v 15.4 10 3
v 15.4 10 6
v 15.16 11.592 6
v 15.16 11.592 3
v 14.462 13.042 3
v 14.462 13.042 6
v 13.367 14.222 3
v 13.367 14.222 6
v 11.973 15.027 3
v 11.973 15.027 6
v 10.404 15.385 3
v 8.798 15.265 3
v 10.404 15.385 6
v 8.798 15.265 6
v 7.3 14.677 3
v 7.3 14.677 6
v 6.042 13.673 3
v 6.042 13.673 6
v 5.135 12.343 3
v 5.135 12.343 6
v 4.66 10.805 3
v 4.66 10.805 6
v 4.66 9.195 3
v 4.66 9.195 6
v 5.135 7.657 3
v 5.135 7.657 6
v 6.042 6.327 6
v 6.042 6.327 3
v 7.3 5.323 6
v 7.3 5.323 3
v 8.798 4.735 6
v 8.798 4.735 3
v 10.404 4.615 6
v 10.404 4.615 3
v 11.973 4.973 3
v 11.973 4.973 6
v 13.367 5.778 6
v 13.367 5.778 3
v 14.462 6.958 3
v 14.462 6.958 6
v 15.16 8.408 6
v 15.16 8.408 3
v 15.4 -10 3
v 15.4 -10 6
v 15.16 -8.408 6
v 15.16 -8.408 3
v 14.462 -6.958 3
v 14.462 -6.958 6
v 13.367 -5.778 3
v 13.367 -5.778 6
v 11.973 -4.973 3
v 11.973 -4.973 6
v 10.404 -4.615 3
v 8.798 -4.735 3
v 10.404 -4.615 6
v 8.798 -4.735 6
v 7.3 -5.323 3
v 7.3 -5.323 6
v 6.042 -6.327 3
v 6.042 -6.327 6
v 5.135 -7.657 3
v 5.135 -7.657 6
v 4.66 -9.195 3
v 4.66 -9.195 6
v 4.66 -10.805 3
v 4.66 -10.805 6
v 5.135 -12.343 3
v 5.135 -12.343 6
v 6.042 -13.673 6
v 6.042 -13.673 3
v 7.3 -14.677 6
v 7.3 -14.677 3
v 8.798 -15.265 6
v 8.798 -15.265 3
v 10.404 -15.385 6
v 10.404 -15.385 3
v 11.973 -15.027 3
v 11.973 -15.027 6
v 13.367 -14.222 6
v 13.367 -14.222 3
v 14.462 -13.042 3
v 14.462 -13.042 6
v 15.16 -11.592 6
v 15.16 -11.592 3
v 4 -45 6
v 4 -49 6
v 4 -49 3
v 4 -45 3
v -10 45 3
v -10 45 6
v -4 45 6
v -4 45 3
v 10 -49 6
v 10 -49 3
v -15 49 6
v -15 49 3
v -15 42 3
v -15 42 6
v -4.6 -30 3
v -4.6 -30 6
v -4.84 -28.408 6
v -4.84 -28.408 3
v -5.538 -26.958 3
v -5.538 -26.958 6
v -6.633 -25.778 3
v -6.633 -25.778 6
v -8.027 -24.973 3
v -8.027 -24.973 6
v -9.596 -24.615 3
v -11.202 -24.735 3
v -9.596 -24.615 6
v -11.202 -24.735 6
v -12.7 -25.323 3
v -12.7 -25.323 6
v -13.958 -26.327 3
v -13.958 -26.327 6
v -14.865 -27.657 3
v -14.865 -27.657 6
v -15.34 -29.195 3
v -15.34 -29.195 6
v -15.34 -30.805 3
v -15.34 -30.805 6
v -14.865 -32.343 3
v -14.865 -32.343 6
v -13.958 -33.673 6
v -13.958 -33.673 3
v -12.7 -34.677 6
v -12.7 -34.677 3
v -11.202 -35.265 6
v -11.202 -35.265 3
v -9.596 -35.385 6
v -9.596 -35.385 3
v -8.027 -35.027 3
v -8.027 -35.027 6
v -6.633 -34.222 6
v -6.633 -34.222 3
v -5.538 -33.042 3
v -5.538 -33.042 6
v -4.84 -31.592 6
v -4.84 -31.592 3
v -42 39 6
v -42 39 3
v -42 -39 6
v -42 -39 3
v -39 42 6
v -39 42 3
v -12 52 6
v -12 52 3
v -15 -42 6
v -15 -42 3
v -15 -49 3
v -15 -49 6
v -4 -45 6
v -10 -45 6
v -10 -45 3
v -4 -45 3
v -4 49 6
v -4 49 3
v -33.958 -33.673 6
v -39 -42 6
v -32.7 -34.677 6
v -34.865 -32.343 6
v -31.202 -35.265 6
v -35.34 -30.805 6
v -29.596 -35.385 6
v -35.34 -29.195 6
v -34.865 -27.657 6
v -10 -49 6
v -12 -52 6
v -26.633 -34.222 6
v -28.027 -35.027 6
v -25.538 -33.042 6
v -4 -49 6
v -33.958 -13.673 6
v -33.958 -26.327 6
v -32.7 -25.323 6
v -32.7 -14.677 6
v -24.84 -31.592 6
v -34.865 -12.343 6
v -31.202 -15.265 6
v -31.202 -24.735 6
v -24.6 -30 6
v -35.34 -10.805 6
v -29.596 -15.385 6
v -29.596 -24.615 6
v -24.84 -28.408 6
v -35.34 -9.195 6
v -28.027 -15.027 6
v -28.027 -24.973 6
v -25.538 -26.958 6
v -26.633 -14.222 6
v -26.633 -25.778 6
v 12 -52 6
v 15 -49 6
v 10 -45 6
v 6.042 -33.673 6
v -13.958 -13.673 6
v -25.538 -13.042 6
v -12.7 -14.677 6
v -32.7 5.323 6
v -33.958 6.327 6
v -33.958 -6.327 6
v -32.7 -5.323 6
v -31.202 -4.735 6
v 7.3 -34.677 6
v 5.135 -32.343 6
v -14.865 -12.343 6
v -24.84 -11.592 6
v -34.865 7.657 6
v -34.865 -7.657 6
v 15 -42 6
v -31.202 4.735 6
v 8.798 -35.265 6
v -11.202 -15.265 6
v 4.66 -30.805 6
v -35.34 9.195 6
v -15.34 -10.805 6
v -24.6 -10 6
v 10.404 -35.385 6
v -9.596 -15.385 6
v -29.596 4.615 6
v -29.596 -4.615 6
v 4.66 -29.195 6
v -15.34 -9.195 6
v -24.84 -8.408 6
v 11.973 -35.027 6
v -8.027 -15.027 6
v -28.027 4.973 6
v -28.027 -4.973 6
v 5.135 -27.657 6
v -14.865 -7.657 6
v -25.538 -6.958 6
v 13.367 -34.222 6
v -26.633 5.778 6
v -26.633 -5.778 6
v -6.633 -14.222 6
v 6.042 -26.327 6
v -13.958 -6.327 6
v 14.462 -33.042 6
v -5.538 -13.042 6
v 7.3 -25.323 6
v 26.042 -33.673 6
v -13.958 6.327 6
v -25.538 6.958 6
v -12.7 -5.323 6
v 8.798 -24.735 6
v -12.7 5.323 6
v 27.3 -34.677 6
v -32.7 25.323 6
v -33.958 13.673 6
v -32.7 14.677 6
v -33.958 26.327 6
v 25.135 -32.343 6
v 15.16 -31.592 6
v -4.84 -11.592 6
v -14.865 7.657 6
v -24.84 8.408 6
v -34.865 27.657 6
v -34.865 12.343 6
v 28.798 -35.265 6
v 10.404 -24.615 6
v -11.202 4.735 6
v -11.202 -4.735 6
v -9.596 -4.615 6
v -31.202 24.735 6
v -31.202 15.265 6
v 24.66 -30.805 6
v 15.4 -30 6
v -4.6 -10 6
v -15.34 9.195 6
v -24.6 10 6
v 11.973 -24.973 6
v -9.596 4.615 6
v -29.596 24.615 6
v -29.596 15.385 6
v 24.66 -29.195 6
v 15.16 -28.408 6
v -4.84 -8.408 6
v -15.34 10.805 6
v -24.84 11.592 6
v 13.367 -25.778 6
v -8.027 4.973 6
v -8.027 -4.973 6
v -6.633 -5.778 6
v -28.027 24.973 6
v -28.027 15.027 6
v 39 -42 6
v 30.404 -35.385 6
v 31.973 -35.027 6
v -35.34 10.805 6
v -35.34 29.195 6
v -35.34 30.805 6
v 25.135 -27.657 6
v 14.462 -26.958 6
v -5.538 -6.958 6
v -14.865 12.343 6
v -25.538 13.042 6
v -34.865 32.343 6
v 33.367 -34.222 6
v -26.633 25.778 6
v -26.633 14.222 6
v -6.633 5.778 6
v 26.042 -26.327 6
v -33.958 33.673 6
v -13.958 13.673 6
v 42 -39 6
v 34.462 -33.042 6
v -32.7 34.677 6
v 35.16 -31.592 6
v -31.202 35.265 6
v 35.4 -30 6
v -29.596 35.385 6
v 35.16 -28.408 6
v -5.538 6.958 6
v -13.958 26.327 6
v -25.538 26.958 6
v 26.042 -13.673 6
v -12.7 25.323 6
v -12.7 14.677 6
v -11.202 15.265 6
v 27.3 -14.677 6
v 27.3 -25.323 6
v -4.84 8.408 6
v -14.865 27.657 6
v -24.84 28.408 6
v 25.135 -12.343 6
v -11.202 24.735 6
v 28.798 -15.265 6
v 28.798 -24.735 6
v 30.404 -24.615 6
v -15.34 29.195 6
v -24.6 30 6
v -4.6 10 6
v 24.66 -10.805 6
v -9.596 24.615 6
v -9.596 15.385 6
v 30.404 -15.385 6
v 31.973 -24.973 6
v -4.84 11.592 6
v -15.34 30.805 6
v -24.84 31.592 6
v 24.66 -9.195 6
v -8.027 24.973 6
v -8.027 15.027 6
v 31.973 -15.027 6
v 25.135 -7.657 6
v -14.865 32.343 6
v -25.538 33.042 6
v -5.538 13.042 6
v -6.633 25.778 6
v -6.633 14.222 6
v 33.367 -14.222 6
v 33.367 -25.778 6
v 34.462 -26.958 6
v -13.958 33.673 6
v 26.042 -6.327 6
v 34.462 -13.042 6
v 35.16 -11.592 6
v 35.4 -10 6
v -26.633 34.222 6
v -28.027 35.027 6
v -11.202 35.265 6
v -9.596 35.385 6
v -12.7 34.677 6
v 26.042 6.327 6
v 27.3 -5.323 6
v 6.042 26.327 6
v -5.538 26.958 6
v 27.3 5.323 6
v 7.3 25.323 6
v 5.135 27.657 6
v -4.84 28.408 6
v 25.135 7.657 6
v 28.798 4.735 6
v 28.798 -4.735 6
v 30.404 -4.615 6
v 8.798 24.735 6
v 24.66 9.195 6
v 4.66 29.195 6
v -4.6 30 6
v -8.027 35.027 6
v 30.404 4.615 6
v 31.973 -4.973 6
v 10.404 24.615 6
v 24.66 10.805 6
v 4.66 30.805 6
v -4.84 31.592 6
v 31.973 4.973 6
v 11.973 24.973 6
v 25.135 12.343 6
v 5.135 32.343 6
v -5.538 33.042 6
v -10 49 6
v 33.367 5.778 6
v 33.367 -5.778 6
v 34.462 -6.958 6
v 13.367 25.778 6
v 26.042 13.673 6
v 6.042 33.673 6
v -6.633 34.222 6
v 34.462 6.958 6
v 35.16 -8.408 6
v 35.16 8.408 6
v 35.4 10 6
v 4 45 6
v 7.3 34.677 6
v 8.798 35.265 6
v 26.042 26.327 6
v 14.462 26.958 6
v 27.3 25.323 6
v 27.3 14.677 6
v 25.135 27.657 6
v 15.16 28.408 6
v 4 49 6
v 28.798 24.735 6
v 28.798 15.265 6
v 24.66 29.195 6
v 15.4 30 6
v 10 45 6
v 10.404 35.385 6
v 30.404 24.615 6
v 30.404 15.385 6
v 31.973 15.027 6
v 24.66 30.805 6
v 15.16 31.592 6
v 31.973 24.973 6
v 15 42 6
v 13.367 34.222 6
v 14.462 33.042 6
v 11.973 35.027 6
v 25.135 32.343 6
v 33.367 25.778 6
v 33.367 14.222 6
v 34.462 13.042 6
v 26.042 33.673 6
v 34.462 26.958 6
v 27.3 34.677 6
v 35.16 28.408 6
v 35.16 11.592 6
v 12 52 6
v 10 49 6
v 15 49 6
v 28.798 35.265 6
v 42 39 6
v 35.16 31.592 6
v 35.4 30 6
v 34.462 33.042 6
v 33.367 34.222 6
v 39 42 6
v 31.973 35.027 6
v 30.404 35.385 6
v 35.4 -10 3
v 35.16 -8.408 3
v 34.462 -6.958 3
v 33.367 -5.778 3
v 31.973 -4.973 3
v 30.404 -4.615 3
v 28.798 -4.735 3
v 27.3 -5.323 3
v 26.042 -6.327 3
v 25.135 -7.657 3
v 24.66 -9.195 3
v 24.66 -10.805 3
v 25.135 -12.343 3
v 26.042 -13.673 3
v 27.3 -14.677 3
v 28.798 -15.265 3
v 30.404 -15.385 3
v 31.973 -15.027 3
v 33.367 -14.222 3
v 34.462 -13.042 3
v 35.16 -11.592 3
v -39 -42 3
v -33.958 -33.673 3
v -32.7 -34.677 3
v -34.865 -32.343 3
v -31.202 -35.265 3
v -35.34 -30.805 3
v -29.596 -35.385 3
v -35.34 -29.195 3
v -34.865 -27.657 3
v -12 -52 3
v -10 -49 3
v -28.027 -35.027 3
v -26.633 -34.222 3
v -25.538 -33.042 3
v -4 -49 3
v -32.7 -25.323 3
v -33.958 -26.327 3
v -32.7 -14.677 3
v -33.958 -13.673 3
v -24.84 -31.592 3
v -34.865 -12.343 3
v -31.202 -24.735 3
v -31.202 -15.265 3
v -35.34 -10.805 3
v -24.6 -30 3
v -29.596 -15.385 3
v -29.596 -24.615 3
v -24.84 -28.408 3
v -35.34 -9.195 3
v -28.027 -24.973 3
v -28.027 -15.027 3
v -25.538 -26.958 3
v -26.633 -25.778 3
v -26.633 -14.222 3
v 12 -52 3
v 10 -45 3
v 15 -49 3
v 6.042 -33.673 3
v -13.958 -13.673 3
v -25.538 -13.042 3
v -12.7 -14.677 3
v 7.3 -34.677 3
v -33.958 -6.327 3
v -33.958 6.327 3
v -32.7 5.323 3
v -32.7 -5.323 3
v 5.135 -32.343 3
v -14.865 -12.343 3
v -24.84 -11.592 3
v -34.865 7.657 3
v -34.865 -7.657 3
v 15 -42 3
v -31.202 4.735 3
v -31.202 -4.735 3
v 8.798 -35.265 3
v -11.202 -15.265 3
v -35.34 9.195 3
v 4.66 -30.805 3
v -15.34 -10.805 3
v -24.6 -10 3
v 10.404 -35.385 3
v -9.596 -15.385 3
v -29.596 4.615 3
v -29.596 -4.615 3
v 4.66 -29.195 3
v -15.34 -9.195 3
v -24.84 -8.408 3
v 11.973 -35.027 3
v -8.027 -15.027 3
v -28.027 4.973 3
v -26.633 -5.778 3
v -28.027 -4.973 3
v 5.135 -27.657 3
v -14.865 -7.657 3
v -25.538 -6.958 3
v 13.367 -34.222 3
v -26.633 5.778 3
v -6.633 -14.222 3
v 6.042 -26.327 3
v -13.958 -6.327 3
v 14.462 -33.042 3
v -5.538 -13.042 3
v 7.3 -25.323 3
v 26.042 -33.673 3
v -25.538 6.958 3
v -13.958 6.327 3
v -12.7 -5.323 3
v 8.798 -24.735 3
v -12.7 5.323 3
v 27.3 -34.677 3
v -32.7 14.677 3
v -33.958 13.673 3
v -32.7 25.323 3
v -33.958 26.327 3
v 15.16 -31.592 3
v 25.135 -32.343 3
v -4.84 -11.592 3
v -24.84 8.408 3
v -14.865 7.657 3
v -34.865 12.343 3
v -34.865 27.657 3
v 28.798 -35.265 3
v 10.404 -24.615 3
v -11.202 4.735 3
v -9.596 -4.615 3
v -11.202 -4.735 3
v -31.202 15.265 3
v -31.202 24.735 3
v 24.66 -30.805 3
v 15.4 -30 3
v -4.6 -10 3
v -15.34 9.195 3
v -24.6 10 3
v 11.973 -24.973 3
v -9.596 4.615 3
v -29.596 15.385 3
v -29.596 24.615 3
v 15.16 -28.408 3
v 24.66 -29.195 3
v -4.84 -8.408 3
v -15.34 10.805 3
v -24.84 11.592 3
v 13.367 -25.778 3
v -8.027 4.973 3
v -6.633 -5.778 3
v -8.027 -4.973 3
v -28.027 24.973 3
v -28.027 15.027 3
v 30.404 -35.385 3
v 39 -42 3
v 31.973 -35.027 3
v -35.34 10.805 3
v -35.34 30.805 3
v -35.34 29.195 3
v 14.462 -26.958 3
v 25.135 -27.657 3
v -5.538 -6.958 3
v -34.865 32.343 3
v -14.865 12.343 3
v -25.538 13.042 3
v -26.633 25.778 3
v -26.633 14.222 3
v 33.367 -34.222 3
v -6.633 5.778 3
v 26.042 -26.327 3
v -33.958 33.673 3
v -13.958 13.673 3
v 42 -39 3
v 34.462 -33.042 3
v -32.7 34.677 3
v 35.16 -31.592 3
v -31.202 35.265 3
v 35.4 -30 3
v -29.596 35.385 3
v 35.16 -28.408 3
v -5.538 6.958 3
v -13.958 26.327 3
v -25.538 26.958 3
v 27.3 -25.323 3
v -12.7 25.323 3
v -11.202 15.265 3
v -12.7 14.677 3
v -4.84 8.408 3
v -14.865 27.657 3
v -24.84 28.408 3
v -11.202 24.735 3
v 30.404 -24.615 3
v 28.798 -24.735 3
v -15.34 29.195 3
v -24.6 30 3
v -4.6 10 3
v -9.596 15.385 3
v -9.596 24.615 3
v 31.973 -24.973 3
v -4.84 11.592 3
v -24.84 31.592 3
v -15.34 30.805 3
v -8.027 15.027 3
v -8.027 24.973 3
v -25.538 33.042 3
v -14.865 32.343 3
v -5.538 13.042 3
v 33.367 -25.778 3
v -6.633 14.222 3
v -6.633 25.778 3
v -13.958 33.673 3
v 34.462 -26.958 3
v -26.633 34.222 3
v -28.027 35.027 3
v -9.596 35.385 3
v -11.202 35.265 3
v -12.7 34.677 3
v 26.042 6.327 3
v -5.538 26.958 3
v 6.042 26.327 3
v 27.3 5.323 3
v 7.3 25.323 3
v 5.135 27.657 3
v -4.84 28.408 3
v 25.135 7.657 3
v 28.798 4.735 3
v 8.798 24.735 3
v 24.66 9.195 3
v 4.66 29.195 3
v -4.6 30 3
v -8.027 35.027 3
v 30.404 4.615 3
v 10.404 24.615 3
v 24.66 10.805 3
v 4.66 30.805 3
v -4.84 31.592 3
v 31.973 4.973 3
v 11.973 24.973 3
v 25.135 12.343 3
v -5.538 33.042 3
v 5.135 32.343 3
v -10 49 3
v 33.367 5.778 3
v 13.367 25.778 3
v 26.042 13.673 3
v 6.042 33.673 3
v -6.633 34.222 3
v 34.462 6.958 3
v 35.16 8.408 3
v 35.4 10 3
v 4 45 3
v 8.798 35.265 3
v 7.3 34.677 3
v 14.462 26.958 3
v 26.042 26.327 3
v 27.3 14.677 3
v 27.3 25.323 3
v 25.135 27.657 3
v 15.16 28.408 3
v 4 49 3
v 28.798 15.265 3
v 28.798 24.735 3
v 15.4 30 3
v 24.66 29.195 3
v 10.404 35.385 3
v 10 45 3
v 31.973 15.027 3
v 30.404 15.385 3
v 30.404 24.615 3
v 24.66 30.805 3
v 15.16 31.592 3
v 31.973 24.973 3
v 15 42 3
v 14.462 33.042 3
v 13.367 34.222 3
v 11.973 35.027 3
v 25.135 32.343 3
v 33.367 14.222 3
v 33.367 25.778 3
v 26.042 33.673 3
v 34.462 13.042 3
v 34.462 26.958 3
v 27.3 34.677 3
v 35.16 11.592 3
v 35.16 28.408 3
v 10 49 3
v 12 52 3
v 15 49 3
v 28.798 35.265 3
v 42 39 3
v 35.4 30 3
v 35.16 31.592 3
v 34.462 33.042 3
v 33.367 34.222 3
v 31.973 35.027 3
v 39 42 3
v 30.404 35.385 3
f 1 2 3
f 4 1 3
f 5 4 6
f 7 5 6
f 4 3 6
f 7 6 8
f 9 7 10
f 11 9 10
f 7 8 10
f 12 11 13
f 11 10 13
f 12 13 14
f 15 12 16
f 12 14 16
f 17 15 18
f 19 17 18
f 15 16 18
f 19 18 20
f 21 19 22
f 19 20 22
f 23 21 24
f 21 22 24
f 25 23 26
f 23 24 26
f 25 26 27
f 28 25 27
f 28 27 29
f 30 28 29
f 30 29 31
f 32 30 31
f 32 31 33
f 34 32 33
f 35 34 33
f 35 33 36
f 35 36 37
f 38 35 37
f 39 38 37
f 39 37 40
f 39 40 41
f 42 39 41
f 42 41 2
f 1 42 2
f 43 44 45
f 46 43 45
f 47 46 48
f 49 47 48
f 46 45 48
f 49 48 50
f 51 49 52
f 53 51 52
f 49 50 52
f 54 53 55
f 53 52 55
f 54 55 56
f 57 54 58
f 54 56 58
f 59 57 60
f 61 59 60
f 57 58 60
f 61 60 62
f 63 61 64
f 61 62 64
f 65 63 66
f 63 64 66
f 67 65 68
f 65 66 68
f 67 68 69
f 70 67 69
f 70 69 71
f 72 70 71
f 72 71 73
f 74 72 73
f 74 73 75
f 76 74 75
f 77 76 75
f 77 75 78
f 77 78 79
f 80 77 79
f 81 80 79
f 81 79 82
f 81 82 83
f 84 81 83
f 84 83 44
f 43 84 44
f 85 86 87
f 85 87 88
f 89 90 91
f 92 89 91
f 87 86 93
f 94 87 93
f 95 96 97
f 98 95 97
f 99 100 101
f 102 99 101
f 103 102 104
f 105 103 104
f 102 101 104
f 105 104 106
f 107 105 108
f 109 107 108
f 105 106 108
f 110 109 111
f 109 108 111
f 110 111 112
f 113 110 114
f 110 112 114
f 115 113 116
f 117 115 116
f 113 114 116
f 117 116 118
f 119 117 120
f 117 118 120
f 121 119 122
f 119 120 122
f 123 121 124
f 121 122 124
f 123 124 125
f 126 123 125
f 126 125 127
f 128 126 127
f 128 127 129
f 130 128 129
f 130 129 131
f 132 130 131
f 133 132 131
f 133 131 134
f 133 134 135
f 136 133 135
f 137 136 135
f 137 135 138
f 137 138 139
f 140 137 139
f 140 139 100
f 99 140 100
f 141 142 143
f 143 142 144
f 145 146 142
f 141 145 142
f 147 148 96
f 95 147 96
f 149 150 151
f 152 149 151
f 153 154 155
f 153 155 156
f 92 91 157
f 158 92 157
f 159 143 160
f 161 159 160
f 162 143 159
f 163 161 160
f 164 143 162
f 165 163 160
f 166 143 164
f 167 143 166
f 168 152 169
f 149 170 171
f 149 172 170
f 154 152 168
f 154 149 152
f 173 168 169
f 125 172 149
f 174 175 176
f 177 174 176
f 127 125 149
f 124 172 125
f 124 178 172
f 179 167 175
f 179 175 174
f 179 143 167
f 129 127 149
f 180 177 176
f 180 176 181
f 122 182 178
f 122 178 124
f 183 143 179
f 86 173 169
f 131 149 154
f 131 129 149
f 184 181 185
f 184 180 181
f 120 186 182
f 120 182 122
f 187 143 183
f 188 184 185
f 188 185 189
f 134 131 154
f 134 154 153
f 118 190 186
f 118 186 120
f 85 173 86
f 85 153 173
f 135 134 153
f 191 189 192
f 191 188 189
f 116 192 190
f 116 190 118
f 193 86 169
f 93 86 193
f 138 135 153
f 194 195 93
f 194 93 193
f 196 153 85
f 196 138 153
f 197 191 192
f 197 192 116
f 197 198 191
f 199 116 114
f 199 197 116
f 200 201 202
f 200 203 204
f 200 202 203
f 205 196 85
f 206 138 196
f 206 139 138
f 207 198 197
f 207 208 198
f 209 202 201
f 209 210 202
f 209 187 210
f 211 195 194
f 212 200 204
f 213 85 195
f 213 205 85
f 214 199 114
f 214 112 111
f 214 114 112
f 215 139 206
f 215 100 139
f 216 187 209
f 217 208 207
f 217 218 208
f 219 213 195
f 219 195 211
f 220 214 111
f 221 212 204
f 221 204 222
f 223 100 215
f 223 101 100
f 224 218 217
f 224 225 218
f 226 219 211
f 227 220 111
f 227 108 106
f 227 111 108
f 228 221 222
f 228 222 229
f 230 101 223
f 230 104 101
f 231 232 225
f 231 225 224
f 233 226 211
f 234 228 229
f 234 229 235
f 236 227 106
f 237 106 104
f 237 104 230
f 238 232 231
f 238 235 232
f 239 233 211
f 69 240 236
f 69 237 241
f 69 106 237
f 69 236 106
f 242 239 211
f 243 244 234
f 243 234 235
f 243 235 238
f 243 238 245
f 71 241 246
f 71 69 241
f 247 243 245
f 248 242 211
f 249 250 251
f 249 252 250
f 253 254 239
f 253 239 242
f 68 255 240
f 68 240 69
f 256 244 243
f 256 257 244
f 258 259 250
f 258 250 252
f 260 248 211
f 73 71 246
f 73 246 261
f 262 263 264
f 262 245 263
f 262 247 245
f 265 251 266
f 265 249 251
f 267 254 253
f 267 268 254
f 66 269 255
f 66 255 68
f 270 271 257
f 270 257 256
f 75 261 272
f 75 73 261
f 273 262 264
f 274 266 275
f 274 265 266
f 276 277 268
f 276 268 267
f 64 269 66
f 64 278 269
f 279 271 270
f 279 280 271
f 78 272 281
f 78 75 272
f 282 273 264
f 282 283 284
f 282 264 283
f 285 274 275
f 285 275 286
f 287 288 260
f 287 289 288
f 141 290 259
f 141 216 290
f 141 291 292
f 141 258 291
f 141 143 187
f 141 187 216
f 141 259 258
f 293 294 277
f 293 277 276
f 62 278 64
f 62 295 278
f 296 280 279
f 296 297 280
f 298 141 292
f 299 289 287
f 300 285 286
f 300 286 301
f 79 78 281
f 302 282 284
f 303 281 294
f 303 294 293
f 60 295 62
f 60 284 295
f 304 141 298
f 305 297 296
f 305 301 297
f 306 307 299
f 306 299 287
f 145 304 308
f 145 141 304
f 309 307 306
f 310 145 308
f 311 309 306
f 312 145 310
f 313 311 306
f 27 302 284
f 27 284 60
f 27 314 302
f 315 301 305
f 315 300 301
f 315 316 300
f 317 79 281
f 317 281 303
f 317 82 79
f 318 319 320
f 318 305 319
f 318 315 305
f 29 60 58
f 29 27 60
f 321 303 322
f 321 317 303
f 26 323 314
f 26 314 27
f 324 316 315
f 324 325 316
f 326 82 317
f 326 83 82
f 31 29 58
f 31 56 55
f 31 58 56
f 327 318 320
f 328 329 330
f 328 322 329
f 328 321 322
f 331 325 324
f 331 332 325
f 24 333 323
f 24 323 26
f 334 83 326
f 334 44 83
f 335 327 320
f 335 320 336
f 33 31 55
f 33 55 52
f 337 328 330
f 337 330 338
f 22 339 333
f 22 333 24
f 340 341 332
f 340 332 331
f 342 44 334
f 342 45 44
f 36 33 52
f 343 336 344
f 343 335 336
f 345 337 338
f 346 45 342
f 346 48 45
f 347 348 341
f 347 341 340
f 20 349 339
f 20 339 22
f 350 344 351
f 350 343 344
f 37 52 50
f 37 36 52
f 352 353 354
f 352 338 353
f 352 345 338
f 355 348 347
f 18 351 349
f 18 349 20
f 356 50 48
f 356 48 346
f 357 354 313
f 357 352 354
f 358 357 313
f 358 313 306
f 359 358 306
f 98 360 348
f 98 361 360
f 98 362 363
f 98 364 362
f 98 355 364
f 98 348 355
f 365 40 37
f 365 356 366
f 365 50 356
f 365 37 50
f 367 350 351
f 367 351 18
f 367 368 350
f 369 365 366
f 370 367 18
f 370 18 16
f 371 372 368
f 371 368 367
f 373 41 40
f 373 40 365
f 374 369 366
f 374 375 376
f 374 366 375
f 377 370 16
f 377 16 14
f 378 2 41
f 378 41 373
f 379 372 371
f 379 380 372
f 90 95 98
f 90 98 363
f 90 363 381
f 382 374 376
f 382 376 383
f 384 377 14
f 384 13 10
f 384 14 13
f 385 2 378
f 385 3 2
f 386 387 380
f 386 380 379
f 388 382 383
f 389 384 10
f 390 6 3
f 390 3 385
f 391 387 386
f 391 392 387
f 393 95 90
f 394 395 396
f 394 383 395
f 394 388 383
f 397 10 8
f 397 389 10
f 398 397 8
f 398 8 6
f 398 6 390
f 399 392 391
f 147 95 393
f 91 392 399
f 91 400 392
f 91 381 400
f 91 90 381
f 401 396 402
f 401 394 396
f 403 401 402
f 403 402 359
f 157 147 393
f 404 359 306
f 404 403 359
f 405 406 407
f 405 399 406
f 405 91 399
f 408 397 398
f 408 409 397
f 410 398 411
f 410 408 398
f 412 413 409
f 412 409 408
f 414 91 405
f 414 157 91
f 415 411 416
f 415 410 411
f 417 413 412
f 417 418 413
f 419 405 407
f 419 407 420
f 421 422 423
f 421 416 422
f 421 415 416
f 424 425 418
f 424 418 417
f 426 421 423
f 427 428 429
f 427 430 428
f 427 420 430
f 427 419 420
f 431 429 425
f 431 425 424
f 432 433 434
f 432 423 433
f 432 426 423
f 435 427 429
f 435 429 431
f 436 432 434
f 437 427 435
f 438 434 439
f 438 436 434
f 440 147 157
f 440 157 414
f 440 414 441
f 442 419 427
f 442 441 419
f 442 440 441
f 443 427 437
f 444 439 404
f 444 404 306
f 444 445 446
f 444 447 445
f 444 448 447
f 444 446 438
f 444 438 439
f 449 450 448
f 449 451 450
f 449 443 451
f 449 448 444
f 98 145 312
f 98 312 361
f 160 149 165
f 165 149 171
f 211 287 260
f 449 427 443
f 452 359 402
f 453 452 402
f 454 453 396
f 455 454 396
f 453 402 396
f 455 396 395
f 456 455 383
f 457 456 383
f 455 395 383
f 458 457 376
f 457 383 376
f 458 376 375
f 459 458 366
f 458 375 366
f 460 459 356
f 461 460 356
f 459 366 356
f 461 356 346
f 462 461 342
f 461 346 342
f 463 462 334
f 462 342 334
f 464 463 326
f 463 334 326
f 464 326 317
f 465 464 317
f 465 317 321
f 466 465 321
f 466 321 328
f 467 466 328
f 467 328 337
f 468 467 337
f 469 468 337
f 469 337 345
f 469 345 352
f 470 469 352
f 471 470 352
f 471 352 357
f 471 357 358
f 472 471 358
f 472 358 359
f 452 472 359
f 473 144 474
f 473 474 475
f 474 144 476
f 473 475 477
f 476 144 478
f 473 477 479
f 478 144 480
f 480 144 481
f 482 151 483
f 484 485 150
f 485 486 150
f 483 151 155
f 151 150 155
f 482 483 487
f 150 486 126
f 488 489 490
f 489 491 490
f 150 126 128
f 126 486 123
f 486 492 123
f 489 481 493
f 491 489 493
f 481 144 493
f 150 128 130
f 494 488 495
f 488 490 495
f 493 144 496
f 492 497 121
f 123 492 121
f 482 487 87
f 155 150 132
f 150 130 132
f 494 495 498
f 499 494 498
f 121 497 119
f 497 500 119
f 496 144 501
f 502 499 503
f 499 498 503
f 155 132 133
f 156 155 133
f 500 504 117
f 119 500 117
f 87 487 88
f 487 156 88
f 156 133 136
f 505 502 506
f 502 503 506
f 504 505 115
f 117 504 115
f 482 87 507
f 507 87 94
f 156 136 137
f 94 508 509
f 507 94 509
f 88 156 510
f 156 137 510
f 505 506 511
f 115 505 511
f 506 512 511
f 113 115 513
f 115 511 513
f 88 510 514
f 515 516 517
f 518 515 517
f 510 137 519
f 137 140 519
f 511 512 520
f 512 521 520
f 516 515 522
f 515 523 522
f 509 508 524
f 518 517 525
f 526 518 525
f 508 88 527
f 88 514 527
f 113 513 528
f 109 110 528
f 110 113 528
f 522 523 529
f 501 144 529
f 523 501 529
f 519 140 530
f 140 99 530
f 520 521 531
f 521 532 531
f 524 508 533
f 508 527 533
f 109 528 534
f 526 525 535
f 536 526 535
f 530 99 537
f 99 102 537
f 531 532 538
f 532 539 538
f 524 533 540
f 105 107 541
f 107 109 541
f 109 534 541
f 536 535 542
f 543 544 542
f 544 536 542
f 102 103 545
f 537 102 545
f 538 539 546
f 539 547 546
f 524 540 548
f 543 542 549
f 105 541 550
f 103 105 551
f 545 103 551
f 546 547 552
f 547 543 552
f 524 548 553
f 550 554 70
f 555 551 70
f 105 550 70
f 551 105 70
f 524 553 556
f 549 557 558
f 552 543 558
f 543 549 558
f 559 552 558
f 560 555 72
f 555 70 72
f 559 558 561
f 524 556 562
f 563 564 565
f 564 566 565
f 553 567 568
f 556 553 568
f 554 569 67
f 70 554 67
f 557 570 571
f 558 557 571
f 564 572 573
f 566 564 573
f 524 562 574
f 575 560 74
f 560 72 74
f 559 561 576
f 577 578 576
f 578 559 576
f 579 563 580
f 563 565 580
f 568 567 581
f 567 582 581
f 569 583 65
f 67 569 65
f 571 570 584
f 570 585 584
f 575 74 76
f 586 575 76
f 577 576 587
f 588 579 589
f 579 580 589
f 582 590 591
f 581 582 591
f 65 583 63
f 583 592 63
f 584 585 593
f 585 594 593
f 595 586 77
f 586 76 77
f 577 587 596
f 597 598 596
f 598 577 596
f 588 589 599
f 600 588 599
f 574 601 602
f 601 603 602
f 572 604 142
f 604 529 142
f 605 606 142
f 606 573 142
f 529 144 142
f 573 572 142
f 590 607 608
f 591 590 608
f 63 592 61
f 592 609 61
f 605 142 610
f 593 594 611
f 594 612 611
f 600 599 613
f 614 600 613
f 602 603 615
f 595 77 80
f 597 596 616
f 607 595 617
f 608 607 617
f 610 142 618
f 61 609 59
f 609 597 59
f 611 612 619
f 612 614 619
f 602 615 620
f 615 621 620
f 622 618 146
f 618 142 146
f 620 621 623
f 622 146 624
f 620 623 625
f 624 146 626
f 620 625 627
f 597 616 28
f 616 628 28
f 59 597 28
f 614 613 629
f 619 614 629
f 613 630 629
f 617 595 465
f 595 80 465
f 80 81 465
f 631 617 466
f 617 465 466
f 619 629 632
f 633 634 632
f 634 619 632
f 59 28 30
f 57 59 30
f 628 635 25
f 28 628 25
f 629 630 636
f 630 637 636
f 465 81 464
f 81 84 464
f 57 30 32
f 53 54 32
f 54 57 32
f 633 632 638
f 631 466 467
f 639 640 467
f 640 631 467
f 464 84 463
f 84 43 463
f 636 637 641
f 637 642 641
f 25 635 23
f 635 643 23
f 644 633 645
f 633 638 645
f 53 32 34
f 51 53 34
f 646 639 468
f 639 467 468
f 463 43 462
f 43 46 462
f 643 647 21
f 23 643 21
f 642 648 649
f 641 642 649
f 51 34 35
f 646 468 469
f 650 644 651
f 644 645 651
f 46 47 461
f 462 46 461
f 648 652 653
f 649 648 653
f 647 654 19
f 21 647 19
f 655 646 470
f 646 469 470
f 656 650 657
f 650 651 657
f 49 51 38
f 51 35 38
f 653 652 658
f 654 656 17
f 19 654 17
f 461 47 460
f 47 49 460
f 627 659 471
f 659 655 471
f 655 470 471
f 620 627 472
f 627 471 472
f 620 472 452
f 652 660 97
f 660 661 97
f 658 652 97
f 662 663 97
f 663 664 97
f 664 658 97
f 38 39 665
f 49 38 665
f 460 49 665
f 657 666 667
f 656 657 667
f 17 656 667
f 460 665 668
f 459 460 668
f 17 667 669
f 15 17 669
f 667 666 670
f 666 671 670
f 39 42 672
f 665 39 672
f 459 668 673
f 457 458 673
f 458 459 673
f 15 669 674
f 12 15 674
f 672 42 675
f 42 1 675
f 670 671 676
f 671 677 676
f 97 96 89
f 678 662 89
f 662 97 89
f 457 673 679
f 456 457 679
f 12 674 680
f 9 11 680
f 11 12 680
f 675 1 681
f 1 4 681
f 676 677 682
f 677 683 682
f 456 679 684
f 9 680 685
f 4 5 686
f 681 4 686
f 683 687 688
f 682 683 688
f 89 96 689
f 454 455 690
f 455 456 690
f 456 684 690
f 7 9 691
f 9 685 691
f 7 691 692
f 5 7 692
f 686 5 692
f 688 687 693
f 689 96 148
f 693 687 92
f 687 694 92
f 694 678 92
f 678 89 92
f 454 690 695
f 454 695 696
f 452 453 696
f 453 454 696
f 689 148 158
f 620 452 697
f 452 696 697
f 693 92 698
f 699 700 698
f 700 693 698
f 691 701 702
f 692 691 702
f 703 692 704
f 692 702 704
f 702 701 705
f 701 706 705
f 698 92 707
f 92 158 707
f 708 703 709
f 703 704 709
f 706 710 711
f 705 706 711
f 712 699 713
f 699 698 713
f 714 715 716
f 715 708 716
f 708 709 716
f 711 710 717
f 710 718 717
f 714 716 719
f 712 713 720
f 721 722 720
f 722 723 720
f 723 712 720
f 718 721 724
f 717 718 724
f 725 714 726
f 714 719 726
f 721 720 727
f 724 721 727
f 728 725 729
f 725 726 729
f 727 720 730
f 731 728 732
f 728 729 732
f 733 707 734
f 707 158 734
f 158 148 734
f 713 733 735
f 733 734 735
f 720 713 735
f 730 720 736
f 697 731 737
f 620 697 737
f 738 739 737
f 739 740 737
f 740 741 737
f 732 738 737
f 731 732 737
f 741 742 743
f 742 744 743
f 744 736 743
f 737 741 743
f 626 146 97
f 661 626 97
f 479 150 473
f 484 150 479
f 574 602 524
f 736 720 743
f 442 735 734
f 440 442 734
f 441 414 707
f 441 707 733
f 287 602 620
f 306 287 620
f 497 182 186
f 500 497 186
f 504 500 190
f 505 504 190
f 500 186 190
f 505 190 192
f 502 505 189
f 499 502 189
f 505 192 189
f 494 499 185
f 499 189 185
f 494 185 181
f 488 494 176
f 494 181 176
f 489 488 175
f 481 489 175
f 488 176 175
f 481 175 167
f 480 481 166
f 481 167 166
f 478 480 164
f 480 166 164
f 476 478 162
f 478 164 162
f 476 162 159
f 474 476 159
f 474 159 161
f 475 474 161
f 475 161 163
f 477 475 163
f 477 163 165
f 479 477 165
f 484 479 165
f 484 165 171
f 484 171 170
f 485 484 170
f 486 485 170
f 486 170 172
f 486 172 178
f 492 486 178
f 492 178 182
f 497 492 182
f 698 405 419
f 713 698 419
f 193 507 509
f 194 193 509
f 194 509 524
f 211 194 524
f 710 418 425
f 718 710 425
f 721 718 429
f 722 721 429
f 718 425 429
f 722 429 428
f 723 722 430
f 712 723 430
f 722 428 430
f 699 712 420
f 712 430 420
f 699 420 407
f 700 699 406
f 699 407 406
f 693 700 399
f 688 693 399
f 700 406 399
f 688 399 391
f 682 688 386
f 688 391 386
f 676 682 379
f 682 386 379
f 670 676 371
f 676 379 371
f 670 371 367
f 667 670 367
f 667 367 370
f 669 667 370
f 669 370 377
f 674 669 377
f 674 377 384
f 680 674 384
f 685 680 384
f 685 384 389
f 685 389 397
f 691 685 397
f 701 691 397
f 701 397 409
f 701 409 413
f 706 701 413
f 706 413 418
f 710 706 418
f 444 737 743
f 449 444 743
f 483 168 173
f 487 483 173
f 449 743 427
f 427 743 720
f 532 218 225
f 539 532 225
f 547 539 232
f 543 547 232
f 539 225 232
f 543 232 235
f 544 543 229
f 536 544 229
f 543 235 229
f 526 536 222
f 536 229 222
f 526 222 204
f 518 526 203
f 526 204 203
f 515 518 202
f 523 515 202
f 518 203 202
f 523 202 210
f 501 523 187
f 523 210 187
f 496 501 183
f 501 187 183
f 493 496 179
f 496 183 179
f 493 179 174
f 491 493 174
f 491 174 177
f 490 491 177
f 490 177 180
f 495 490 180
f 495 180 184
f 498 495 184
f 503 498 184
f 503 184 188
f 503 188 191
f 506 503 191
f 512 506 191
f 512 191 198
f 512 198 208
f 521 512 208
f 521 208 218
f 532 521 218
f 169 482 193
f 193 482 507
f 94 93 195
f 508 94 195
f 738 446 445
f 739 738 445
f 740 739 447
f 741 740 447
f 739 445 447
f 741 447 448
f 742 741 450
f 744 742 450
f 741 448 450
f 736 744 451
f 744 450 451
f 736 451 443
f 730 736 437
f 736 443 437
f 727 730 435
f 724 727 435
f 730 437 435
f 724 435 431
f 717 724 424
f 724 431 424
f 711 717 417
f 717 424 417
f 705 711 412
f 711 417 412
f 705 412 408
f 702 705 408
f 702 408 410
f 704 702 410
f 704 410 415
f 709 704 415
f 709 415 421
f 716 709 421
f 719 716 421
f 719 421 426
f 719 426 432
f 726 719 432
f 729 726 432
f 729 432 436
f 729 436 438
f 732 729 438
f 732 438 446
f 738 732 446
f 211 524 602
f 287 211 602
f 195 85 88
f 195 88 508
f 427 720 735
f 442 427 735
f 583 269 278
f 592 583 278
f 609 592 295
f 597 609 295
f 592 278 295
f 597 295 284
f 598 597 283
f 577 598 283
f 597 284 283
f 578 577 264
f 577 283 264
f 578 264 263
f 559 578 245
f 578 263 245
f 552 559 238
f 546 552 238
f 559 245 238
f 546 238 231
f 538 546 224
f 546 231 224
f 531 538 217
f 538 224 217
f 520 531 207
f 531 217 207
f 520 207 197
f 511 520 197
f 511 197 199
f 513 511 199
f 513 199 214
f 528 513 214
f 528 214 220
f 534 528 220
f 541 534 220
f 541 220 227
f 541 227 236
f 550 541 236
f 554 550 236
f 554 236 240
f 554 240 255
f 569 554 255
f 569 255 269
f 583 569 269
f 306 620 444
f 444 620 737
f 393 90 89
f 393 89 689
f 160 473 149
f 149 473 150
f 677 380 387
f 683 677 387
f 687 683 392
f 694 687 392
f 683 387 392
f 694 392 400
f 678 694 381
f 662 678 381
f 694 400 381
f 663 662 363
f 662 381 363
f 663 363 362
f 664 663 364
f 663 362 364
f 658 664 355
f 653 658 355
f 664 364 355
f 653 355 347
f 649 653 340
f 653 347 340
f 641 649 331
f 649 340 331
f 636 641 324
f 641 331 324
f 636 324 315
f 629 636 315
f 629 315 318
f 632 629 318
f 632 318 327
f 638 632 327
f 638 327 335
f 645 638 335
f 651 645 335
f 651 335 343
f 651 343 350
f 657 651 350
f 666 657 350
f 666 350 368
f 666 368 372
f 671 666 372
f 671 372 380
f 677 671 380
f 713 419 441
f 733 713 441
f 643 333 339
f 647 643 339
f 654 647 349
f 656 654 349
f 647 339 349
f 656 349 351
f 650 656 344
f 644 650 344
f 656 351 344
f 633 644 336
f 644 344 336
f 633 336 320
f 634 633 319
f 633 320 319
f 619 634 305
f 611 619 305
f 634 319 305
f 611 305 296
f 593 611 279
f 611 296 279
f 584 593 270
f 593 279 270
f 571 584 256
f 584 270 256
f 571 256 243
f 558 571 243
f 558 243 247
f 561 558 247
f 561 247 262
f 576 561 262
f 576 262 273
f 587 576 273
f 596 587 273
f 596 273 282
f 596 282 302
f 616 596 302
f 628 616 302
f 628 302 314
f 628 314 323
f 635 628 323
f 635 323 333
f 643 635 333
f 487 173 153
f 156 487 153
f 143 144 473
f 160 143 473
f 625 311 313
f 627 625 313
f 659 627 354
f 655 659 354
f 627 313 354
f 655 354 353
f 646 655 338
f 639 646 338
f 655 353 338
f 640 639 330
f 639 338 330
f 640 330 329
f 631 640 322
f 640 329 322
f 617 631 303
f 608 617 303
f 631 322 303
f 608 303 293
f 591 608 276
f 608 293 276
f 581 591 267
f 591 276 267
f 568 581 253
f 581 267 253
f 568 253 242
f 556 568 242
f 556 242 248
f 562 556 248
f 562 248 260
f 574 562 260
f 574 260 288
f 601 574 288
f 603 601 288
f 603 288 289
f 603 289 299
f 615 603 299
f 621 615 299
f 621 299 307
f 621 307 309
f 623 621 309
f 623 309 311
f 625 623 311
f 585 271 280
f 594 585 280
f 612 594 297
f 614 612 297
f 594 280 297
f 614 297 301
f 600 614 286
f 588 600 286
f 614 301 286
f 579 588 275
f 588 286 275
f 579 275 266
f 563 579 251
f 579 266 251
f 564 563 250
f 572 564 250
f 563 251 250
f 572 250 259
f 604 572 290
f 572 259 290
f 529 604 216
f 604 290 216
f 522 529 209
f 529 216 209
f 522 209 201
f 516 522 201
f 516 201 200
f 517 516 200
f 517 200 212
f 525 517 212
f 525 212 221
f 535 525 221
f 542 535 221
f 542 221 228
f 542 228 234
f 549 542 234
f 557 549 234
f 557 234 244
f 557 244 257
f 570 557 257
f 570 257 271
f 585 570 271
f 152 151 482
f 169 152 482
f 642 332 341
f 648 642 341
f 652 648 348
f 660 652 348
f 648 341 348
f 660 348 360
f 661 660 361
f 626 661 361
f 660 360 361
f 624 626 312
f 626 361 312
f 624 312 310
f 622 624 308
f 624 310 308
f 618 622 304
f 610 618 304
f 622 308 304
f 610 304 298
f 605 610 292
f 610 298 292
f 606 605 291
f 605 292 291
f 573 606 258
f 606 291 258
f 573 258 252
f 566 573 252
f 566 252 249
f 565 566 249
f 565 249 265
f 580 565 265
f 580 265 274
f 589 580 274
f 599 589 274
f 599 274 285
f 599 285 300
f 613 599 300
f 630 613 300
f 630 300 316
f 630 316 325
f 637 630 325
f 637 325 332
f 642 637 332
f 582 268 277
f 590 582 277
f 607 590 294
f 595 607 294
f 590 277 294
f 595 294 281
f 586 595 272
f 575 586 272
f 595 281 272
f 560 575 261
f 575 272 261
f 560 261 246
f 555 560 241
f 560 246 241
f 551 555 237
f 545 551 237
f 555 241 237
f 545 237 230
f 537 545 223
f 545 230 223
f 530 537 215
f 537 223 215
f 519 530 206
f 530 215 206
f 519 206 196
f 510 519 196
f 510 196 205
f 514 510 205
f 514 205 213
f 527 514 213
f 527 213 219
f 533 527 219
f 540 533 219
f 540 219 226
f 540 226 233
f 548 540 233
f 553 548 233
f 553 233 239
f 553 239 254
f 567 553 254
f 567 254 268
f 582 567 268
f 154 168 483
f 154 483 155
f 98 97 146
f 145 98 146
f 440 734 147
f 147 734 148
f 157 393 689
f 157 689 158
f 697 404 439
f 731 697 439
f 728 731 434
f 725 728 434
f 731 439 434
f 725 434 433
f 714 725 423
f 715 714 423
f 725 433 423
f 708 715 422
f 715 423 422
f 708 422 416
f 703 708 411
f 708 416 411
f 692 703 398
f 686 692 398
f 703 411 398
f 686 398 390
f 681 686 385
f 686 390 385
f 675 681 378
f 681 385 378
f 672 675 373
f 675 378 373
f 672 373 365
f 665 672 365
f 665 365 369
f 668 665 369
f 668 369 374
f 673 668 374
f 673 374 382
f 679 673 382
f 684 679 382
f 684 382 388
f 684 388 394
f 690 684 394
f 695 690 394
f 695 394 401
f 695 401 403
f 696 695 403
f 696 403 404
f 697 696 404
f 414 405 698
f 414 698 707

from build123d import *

# Parameters (mm, degrees)
PAD025_DEPTH    = 3
SKETCH041_R     = 5.4
POCKET015_DEPTH = 5
SKETCH042_W     = 6
SKETCH042_H     = 4
POCKET016_DEPTH = 5


with BuildPart() as part:
    # Sketch040 (on Face5 of Binder007) → Pad025 (new body)
    with BuildSketch(Plane.XY.offset(3)):
        Polygon((12, 52), (-12, 52), (-15, 49), (-15, 42), (-39, 42), (-42, 39), (-42, -39), (-39, -42), (-15, -42), (-15, -49), (-12, -52), (12, -52), (15, -49), (15, -42), (39, -42), (42, -39), (42, 39), (39, 42), (15, 42), (15, 49), align=None)
    extrude(amount=PAD025_DEPTH)

    # Sketch041 (on Face22 of Pad025) → Pocket015 (cut)
    with BuildSketch(Plane.XY.offset(6)):
        with Locations((-30, 30)):
            Circle(SKETCH041_R)
        with Locations((-10, 30)):
            Circle(SKETCH041_R)
        with Locations((10, 30)):
            Circle(SKETCH041_R)
        with Locations((30, 30)):
            Circle(SKETCH041_R)
        with Locations((-30, 10)):
            Circle(SKETCH041_R)
        with Locations((-10, 10)):
            Circle(SKETCH041_R)
        with Locations((10, 10)):
            Circle(SKETCH041_R)
        with Locations((30, 10)):
            Circle(SKETCH041_R)
        with Locations((-30, -10)):
            Circle(SKETCH041_R)
        with Locations((-10, -10)):
            Circle(SKETCH041_R)
        with Locations((10, -10)):
            Circle(SKETCH041_R)
        with Locations((30, -10)):
            Circle(SKETCH041_R)
        with Locations((-30, -30)):
            Circle(SKETCH041_R)
        with Locations((-10, -30)):
            Circle(SKETCH041_R)
        with Locations((10, -30)):
            Circle(SKETCH041_R)
        with Locations((30, -30)):
            Circle(SKETCH041_R)
    extrude(amount=-POCKET015_DEPTH, mode=Mode.SUBTRACT)

    # Sketch042 (on Face5 of Pocket015) → Pocket016 (cut)
    with BuildSketch(Plane.XY.offset(6)):
        with Locations((-7, -47)):
            Rectangle(SKETCH042_W, SKETCH042_H)
        with Locations((7, -47)):
            Rectangle(SKETCH042_W, SKETCH042_H)
        with Locations((-7, 47)):
            Rectangle(SKETCH042_W, SKETCH042_H)
        with Locations((7, 47)):
            Rectangle(SKETCH042_W, SKETCH042_H)
    extrude(amount=-POCKET016_DEPTH, mode=Mode.SUBTRACT)


solid = part.part
